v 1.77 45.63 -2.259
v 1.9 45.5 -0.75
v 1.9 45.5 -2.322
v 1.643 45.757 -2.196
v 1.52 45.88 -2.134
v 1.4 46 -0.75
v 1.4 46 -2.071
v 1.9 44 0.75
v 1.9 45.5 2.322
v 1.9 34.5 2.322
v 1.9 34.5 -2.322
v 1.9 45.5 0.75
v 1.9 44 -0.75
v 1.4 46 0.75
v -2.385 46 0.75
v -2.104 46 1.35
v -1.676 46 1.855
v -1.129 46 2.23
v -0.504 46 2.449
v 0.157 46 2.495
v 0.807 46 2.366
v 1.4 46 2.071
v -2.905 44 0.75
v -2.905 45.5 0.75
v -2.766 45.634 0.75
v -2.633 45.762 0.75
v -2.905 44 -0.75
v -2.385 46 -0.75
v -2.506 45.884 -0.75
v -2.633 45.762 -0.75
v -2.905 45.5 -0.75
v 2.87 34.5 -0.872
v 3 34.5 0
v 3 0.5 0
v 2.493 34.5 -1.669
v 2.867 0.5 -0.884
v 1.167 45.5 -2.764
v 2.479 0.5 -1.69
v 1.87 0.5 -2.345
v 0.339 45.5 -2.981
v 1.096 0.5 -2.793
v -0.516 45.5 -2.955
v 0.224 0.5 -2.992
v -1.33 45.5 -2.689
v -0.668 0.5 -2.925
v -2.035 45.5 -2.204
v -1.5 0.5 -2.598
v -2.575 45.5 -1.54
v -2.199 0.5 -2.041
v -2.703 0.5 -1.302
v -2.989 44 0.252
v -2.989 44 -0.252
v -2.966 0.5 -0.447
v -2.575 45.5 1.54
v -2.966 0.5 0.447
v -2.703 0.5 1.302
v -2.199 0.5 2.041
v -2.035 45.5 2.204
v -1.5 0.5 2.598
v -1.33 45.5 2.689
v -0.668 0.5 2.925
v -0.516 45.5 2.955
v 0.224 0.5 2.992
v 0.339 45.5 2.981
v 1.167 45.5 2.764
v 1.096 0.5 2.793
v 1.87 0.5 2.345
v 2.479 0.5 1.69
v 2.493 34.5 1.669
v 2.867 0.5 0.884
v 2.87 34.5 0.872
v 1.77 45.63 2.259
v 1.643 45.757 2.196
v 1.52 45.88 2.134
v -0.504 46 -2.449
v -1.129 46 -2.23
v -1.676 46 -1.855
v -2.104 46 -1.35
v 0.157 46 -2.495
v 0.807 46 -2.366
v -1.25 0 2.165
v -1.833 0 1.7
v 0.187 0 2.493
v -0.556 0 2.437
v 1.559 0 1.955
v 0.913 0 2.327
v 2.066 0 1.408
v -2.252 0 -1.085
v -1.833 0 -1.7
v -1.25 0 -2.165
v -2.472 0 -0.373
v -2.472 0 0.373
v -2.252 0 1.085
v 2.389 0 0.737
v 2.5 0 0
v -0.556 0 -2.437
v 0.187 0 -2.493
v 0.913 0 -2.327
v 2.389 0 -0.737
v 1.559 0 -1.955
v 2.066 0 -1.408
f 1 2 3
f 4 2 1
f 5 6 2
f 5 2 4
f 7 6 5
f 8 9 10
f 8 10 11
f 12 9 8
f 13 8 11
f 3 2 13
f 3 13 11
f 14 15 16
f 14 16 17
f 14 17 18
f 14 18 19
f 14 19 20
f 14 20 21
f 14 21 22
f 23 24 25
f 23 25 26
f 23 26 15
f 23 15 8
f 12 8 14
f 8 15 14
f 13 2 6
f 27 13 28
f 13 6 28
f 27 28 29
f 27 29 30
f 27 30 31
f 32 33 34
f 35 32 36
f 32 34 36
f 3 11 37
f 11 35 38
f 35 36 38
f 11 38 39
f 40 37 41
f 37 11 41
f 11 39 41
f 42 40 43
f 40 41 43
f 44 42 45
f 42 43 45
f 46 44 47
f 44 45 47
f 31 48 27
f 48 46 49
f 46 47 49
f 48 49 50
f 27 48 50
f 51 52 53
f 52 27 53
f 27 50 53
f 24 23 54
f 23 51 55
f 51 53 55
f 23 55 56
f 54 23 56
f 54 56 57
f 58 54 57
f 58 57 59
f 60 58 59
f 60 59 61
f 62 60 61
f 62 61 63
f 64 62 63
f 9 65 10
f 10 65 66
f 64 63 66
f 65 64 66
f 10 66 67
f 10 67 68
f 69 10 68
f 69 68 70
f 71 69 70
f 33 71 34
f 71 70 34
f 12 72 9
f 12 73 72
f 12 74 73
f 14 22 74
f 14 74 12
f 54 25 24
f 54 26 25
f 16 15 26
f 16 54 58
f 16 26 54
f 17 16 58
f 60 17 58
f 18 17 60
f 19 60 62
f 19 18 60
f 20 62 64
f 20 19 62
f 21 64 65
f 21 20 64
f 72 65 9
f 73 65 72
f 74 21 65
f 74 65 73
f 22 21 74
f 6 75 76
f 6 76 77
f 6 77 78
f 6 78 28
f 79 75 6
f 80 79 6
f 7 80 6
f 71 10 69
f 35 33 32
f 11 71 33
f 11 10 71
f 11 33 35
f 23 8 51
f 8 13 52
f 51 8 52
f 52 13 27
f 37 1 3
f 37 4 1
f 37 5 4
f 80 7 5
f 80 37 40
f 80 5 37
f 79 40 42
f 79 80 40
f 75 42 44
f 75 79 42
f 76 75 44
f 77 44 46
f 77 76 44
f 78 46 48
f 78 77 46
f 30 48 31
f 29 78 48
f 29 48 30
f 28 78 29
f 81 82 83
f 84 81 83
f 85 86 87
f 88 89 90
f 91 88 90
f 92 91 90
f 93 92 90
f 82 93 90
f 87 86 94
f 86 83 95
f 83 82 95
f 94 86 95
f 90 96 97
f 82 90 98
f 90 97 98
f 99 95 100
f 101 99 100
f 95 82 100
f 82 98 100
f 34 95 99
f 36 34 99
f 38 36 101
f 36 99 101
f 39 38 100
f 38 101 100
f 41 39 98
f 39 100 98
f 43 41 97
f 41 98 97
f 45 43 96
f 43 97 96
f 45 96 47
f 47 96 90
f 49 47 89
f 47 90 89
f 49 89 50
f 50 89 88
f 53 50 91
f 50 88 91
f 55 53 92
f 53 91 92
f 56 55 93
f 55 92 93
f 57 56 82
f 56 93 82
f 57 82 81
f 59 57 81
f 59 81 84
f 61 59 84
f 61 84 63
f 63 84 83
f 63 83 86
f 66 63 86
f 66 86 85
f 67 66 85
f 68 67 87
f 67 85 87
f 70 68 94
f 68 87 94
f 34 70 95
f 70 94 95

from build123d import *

# Parameters (mm, degrees)
SKIZZE1_R                       = 3
AUFSATZ_LINEAR_AUSTRAGEN1_DEPTH = 46
SKIZZE2_W                       = 2.221209883
SKIZZE2_H                       = 8.751437557
SCHNITT_LINEAR_AUSTRAGEN1_DEPTH = 11.5
FASE1_SIZE                      = 0.5
SCHNITT_LINEAR_AUSTRAGEN2_DEPTH = 2


with BuildPart() as part:
    # Skizze1 → Aufsatz-Linear austragen1 (new body)
    with BuildSketch(Plane(origin=(0, 0, 0), x_dir=(1, 0, 0), z_dir=(0, 1, 0))):
        Circle(SKIZZE1_R)
    extrude(amount=AUFSATZ_LINEAR_AUSTRAGEN1_DEPTH)

    # Skizze2 → Schnitt-Linear austragen1 (cut)
    with BuildSketch(Plane(origin=(0, 46, 0), x_dir=(1, 0, 0), z_dir=(0, 1, 0))):
        with Locations((3.010604942, -0.571236499)):
            Rectangle(SKIZZE2_W, SKIZZE2_H)
    extrude(amount=-SCHNITT_LINEAR_AUSTRAGEN1_DEPTH, mode=Mode.SUBTRACT)

    # Fase1
    fase1_edges = [part.edges().sort_by_distance(p)[0] for p in [
        (-3, 0, 0),
        (-3, 46, 0),
        (1.9, 46, 0),
    ]]
    chamfer(fase1_edges, length=FASE1_SIZE)

    # Skizze3 → Schnitt-Linear austragen2 (cut)
    with BuildSketch(Plane(origin=(0, 46, 0), x_dir=(1, 0, 0), z_dir=(0, 1, 0))):
        Polygon((-4.20448111, 0.75), (0.75, 0.75), (4.606648868, 0.75), (4.606648868, -0.75), (0.75, -0.75), (-4.20448111, -0.75), align=None)
    extrude(amount=-SCHNITT_LINEAR_AUSTRAGEN2_DEPTH, mode=Mode.SUBTRACT)


solid = part.part
